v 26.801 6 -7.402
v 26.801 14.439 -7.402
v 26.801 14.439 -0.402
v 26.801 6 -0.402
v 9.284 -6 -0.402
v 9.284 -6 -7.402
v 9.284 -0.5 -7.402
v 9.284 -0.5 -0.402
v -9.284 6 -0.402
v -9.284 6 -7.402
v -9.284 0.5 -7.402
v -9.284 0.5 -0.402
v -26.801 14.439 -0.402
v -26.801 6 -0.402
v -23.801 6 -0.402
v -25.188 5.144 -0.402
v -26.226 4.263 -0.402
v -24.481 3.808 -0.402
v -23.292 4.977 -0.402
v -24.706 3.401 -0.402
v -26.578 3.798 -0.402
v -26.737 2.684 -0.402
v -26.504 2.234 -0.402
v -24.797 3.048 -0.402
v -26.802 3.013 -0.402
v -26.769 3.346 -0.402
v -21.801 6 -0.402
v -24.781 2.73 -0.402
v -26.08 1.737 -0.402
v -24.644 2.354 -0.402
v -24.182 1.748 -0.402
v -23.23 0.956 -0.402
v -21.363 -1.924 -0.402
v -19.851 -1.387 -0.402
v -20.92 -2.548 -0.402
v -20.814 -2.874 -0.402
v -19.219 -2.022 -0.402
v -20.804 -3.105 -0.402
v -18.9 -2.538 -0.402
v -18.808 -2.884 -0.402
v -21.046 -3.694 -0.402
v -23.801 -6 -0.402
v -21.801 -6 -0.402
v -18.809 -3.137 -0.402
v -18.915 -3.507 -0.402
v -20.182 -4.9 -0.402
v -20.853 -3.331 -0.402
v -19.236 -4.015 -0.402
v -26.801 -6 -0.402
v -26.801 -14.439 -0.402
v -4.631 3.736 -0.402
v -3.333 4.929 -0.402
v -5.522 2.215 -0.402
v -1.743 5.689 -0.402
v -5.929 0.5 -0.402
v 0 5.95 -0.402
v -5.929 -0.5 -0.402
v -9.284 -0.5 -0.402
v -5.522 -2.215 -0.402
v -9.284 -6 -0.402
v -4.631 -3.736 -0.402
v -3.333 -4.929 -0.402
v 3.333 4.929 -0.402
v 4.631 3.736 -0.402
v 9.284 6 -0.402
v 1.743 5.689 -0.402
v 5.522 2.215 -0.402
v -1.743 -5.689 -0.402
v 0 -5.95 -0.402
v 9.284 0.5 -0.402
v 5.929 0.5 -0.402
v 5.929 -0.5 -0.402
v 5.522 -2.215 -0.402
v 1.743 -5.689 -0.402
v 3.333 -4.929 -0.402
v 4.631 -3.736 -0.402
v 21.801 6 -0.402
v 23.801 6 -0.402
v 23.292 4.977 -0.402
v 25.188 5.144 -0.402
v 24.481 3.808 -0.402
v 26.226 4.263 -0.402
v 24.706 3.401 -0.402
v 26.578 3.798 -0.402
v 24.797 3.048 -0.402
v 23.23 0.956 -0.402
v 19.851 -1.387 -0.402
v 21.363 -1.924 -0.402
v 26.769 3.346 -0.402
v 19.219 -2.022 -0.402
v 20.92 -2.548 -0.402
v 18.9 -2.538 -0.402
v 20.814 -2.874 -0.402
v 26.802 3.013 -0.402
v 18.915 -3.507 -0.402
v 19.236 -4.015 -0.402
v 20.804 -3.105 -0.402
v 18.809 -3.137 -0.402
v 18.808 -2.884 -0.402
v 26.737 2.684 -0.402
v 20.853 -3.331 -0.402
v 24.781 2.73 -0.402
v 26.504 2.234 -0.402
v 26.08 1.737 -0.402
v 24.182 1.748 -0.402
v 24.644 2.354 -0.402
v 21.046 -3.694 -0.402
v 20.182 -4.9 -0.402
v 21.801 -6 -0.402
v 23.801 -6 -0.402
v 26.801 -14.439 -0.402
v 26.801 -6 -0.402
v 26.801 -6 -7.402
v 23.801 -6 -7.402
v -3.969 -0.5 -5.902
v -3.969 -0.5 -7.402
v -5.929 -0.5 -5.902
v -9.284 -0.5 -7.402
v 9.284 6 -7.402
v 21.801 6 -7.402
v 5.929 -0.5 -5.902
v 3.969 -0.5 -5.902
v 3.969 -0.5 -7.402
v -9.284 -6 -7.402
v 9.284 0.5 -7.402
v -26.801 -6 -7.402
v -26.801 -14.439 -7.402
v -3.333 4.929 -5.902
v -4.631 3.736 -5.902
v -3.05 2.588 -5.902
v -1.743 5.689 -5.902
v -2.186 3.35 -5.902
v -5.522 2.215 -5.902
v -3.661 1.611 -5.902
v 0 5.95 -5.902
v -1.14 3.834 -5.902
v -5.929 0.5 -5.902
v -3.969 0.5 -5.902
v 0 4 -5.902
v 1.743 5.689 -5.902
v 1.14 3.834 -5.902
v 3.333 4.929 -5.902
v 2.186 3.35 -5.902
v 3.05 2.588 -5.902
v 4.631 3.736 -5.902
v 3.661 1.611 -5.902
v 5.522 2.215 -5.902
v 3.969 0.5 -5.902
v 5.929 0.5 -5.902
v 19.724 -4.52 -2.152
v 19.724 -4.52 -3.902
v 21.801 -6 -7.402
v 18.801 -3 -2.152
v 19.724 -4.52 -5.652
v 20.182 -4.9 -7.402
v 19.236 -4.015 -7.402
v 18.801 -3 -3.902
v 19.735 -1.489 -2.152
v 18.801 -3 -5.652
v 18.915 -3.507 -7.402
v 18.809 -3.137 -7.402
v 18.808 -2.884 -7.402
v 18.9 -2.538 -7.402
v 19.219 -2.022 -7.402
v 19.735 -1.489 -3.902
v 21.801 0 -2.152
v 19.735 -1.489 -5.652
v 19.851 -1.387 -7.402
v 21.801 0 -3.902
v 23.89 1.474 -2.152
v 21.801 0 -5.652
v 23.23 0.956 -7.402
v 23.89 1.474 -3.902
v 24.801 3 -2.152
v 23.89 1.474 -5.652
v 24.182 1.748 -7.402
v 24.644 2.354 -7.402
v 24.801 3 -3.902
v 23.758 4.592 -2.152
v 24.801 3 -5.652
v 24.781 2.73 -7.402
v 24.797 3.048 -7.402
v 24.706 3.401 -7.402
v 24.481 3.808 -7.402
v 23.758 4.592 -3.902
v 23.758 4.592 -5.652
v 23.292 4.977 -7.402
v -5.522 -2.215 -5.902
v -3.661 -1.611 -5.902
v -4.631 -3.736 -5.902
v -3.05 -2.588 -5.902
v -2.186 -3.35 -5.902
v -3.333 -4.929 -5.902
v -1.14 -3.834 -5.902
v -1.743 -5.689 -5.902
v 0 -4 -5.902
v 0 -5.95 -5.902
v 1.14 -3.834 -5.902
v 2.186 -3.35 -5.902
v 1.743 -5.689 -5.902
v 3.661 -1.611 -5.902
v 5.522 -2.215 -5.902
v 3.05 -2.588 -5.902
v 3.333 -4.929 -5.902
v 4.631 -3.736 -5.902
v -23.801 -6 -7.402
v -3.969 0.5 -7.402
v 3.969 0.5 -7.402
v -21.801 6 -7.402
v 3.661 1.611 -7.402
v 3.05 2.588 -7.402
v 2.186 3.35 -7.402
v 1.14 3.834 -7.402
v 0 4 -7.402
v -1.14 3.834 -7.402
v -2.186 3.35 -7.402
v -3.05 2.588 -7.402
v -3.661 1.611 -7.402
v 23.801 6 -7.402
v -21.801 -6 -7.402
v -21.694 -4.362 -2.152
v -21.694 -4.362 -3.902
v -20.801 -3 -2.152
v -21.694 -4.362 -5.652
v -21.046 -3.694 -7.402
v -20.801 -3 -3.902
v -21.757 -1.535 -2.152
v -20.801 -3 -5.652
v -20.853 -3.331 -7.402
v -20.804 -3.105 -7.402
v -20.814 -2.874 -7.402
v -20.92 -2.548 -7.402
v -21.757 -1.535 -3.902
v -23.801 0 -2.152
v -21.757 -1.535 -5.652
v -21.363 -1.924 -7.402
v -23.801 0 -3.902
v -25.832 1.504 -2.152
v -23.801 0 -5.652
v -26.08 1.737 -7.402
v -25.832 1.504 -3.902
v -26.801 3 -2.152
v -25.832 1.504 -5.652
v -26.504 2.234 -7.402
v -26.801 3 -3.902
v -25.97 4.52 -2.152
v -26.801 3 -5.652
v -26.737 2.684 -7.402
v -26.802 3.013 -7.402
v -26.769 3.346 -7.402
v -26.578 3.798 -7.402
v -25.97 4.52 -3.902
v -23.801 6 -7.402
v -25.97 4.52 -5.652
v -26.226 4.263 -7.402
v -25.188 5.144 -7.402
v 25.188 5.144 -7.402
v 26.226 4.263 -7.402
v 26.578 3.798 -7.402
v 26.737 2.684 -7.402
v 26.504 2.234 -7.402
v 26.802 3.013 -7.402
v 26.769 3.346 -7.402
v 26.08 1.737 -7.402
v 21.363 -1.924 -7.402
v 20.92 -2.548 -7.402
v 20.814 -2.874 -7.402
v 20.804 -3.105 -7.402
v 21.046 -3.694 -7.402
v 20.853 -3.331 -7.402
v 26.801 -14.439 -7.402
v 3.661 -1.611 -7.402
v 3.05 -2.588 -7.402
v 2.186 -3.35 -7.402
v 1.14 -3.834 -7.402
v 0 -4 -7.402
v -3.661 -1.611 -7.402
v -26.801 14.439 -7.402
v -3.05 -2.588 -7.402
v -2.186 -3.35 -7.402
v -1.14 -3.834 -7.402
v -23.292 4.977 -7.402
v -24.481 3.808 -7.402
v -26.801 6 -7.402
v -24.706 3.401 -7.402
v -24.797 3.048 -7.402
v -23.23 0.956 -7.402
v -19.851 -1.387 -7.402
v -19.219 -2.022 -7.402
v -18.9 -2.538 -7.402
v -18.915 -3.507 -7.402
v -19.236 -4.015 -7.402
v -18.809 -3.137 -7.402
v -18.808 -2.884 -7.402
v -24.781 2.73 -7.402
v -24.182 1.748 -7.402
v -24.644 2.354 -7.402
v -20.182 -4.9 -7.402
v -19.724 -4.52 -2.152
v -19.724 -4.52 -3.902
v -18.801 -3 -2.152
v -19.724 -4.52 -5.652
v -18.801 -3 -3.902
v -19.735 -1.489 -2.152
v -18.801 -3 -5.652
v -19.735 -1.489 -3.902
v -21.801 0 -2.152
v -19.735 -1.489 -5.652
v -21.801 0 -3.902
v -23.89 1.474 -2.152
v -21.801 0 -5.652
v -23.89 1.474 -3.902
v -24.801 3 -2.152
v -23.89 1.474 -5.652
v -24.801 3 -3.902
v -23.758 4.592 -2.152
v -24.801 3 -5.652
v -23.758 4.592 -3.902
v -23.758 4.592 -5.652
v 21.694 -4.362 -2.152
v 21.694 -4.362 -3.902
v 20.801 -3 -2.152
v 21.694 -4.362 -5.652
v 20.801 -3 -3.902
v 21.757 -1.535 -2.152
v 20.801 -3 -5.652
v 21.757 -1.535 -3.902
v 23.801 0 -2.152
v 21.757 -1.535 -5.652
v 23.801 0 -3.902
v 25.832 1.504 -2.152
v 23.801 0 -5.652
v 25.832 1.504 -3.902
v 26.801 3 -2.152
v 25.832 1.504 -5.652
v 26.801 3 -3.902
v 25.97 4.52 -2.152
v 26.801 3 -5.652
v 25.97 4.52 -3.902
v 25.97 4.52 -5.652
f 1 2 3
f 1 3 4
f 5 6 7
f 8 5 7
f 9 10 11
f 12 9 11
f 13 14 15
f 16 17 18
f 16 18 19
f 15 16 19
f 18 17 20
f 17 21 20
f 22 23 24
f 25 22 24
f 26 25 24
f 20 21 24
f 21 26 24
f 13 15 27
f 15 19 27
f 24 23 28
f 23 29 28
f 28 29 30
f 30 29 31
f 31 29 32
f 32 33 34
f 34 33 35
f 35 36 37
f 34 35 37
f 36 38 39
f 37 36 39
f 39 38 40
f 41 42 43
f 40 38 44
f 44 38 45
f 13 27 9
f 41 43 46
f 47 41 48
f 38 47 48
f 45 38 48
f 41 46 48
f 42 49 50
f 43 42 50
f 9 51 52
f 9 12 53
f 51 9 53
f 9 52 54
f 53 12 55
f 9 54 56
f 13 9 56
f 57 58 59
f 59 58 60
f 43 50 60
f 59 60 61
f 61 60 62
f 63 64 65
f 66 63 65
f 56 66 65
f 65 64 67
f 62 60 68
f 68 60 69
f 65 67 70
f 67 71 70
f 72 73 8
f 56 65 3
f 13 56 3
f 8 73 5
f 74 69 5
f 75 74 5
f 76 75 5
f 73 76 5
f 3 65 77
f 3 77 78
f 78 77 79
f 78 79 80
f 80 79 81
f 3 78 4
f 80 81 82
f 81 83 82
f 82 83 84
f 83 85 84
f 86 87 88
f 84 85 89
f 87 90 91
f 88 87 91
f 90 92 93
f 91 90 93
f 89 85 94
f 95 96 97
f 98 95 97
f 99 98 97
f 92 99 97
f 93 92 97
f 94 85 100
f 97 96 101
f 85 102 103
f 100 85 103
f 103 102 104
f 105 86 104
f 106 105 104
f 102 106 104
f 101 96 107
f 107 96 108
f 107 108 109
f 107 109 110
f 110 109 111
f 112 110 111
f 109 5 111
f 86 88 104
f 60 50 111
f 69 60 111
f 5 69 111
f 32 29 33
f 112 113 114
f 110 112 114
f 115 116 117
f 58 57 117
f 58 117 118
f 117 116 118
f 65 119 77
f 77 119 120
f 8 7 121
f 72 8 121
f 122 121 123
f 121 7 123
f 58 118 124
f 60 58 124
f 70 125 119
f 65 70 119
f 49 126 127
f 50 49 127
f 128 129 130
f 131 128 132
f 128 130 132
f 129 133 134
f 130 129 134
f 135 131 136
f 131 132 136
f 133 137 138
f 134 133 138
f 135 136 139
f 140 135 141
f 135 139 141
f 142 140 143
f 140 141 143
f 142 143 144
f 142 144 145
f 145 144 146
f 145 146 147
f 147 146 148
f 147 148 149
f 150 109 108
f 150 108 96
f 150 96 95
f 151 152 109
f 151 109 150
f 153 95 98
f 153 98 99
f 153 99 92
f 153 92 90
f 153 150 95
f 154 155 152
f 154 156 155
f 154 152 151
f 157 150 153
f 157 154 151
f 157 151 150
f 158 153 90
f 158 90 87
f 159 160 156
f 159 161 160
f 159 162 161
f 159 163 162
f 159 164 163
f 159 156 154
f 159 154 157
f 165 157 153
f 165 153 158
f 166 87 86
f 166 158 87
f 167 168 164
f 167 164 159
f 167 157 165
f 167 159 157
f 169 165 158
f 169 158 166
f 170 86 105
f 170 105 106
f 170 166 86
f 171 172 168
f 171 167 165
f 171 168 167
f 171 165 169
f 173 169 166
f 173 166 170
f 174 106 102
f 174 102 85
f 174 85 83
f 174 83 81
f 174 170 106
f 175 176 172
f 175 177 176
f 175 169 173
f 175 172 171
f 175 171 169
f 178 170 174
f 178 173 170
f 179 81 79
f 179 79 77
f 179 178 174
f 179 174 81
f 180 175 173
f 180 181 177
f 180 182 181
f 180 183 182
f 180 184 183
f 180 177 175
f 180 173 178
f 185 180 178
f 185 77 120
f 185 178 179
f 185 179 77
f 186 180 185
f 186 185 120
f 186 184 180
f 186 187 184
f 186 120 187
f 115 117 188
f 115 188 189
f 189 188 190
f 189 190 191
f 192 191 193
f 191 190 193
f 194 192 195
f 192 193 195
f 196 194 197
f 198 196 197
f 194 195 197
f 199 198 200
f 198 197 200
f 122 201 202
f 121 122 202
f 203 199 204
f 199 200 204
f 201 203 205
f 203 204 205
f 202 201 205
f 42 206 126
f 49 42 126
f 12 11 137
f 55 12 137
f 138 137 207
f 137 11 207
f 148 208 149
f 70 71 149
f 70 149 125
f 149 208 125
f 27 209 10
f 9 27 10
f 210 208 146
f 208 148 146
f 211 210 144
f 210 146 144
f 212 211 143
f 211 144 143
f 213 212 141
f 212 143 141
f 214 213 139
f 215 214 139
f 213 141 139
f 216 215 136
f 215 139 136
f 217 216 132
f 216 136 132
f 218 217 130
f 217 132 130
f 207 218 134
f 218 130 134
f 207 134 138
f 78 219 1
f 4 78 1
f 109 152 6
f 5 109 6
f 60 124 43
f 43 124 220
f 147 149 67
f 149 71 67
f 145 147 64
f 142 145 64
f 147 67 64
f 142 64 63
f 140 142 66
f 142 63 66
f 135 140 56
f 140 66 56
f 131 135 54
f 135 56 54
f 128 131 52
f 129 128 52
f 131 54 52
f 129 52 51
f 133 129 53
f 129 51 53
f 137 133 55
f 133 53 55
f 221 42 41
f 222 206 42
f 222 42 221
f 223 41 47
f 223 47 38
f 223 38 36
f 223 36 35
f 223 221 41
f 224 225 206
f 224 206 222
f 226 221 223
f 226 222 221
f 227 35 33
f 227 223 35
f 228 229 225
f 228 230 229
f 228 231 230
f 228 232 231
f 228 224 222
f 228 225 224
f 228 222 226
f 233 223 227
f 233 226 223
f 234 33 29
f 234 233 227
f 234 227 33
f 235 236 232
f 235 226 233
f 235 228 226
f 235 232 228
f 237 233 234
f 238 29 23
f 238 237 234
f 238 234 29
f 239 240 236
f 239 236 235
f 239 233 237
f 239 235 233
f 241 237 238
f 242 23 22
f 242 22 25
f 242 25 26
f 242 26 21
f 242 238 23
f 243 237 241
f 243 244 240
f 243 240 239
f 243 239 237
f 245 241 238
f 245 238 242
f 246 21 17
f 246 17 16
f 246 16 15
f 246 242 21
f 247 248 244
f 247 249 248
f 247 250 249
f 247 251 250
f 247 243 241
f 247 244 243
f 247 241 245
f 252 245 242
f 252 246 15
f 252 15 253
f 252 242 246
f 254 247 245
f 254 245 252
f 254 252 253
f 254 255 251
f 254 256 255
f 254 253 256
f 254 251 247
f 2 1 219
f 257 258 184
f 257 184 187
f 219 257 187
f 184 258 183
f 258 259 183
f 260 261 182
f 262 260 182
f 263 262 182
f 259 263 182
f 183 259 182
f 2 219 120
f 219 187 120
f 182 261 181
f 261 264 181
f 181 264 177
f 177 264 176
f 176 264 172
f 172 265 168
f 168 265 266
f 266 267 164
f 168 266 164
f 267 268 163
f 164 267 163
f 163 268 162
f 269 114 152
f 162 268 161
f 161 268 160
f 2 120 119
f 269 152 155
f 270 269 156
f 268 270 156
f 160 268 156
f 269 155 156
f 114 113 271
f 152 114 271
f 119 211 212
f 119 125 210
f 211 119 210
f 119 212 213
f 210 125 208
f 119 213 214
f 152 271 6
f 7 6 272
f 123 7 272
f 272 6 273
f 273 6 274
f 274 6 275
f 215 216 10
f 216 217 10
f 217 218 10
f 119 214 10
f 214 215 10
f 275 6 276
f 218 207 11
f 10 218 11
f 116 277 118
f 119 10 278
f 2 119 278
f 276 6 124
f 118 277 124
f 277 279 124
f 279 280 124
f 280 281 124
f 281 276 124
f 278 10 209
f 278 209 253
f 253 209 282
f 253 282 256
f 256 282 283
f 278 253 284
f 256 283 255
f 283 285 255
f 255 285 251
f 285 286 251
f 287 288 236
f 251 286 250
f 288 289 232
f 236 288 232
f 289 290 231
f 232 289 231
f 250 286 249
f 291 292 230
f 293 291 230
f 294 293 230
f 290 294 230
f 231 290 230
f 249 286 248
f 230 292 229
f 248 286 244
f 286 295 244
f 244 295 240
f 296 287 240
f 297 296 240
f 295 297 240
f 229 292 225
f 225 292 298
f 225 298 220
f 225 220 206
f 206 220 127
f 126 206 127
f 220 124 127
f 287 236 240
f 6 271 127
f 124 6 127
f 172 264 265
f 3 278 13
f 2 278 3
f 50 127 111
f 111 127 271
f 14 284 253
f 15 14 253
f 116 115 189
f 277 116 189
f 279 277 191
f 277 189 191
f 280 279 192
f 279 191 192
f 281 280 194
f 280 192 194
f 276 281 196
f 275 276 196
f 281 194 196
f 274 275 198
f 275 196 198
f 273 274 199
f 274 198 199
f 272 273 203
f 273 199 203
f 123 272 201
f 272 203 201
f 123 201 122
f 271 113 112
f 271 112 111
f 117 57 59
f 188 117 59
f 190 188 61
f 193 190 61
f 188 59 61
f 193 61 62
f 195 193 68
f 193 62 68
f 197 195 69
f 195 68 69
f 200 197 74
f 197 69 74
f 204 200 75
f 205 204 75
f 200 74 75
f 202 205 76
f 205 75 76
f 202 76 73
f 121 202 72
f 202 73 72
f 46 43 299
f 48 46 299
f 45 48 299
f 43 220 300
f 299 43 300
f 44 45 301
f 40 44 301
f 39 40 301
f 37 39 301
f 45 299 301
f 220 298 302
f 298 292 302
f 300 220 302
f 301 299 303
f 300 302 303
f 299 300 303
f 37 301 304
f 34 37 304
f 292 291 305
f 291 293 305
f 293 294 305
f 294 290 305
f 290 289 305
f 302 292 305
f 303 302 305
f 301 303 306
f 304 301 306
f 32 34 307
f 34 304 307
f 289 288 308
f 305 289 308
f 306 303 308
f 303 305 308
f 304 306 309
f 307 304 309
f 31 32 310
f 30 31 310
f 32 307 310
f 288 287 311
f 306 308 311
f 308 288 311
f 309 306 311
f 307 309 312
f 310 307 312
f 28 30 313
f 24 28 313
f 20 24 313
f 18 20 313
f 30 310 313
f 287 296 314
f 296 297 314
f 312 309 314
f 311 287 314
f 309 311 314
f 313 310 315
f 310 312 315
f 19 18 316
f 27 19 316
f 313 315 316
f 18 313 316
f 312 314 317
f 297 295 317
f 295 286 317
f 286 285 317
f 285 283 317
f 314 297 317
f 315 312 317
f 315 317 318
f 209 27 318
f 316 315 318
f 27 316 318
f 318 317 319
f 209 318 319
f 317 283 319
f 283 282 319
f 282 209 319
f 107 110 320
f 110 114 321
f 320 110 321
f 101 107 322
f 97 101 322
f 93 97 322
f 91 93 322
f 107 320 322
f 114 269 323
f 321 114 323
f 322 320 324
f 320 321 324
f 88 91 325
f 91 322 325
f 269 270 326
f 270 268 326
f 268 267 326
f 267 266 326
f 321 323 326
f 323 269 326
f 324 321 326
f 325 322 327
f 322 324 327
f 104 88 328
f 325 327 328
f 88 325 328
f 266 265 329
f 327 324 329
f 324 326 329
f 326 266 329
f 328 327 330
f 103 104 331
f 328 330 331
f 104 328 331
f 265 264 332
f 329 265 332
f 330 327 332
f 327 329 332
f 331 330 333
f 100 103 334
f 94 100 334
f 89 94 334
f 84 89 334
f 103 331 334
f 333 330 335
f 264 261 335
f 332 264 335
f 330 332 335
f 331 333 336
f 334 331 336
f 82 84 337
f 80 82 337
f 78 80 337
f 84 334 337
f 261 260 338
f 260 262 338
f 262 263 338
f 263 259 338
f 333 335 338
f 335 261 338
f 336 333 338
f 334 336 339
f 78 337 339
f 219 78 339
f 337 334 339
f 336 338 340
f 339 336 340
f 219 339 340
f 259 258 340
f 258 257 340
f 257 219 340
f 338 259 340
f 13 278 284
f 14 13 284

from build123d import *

# Parameters (mm, degrees)
F2_W     = 113.5670877993
F2_H     = 81.1927579343
F2_R     = 31.9732071905
F2_W_2   = 53.6017529666
F2_H_2   = 28.8779456168
F3_DEPTH = 25
F5_DEPTH = 25
F7_DEPTH = 7


with BuildPart() as f1:
    # F0 (on Front) → F1 (revolve)
    with BuildSketch(Plane.XZ):
        Polygon((-5.95, -0.4022617794), (-31.9732071905, -0.4022617794), (-31.9732071905, -7.4022617794), (-4, -7.4022617794), (-4, -5.9022617794), (-5.95, -5.9022617794), align=None)
    revolve(axis=Axis((0, 0, -6.3669939991), (0, 0, 1)))

    # F2 (on face) → F3 (cut)
    with BuildSketch(Plane(origin=(0, 0, -7.4022617794), x_dir=(1, 0, 0), z_dir=(0, 0, -1))):
        with Locations((1.571347937, -4.5206267387)):
            Rectangle(F2_W, F2_H)
        Circle(F2_R, mode=Mode.SUBTRACT)
        Circle(F2_R)
        Rectangle(F2_W_2, F2_H_2, mode=Mode.SUBTRACT)
    extrude(amount=-F3_DEPTH, mode=Mode.SUBTRACT)

    # F4 (on face) → F5 (cut)
    with BuildSketch(Plane(origin=(0, 0, -7.4022617794), x_dir=(1, 0, 0), z_dir=(0, 0, -1))):
        with BuildLine():
            Line((-3.9686269666, 0.5), (-9.2835435644, 0.5))
            Line((-9.2835435644, 0.5), (-9.2835435644, 6))
            Line((-9.2835435644, 6), (-26.8008764833, 6))
            Line((-26.8008764833, 6), (-26.8008764833, -6))
            Line((-26.8008764833, -6), (-9.2835435644, -6))
            Line((-9.2835435644, -6), (-9.2835435644, -0.5))
            Line((-9.2835435644, -0.5), (-3.9686269666, -0.5))
            ThreePointArc((-3.9686269666, -0.5), (-4, 0), (-3.9686269666, 0.5))
        make_face()
        with BuildLine():
            Line((9.2835435644, 0.5), (3.9686269666, 0.5))
            ThreePointArc((3.9686269666, 0.5), (3.9921490369, 0.2504916502), (4, 0))
            ThreePointArc((4, 0), (3.9921490369, -0.2504916502), (3.9686269666, -0.5))
            Line((3.9686269666, -0.5), (9.2835435644, -0.5))
            Line((9.2835435644, -0.5), (9.2835435644, -6))
            Line((9.2835435644, -6), (26.8008764833, -6))
            Line((26.8008764833, -6), (26.8008764833, 6))
            Line((26.8008764833, 6), (9.2835435644, 6))
            Line((9.2835435644, 6), (9.2835435644, 0.5))
        make_face()
    extrude(amount=-F5_DEPTH, mode=Mode.SUBTRACT)

    # F6 (on face) → F7 (join, through all)
    with BuildSketch(Plane(origin=(0, 0, -7.4022617794), x_dir=(1, 0, 0), z_dir=(0, 0, -1))):
        with BuildLine():
            Line((-21.8008764833, 6), (-23.8008764833, 6))
            add(Edge.make_bspline(
                [(-23.8008764833, 6), (-22.2108428095, 4.7094736127), (-19.3347207095, 3.1365293538), (-23.8174722022, -0.0420631575), (-28.2006493816, -2.9682767239), (-25.523675908, -5.0459788725), (-23.8008764833, -6)],
                knots=[0, 0, 0, 0, 0.25, 0.5, 0.75, 1, 1, 1, 1], degree=3))
            Line((-23.8008764833, -6), (-21.8008764833, -6))
            add(Edge.make_bspline(
                [(-21.8008764833, 6), (-20.2684628372, 5.0384721173), (-17.3238246823, 2.9890179574), (-21.7691782562, -0.0192710268), (-26.4047211931, -2.9119338502), (-23.0797043121, -5.1926403316), (-21.8008764833, -6)],
                knots=[0, 0, 0, 0, 0.25, 0.5, 0.75, 1, 1, 1, 1], degree=3))
        make_face()
        with BuildLine():
            add(Edge.make_bspline(
                [(23.8008764833, 6), (22.2108428095, 4.7094736127), (19.3347207095, 3.1365293538), (23.8174722022, -0.0420631575), (28.2006493816, -2.9682767239), (25.523675908, -5.0459788725), (23.8008764833, -6)],
                knots=[0, 0, 0, 0, 0.25, 0.5, 0.75, 1, 1, 1, 1], degree=3))
            Line((23.8008764833, 6), (21.8008764833, 6))
            add(Edge.make_bspline(
                [(21.8008764833, 6), (20.2684628372, 5.0384721173), (17.3238246823, 2.9890179574), (21.7691782562, -0.0192710268), (26.4047211931, -2.9119338502), (23.0797043121, -5.1926403316), (21.8008764833, -6)],
                knots=[0, 0, 0, 0, 0.25, 0.5, 0.75, 1, 1, 1, 1], degree=3))
            Line((21.8008764833, -6), (23.8008764833, -6))
        make_face()
    extrude(amount=-F7_DEPTH)


solid = f1.part
